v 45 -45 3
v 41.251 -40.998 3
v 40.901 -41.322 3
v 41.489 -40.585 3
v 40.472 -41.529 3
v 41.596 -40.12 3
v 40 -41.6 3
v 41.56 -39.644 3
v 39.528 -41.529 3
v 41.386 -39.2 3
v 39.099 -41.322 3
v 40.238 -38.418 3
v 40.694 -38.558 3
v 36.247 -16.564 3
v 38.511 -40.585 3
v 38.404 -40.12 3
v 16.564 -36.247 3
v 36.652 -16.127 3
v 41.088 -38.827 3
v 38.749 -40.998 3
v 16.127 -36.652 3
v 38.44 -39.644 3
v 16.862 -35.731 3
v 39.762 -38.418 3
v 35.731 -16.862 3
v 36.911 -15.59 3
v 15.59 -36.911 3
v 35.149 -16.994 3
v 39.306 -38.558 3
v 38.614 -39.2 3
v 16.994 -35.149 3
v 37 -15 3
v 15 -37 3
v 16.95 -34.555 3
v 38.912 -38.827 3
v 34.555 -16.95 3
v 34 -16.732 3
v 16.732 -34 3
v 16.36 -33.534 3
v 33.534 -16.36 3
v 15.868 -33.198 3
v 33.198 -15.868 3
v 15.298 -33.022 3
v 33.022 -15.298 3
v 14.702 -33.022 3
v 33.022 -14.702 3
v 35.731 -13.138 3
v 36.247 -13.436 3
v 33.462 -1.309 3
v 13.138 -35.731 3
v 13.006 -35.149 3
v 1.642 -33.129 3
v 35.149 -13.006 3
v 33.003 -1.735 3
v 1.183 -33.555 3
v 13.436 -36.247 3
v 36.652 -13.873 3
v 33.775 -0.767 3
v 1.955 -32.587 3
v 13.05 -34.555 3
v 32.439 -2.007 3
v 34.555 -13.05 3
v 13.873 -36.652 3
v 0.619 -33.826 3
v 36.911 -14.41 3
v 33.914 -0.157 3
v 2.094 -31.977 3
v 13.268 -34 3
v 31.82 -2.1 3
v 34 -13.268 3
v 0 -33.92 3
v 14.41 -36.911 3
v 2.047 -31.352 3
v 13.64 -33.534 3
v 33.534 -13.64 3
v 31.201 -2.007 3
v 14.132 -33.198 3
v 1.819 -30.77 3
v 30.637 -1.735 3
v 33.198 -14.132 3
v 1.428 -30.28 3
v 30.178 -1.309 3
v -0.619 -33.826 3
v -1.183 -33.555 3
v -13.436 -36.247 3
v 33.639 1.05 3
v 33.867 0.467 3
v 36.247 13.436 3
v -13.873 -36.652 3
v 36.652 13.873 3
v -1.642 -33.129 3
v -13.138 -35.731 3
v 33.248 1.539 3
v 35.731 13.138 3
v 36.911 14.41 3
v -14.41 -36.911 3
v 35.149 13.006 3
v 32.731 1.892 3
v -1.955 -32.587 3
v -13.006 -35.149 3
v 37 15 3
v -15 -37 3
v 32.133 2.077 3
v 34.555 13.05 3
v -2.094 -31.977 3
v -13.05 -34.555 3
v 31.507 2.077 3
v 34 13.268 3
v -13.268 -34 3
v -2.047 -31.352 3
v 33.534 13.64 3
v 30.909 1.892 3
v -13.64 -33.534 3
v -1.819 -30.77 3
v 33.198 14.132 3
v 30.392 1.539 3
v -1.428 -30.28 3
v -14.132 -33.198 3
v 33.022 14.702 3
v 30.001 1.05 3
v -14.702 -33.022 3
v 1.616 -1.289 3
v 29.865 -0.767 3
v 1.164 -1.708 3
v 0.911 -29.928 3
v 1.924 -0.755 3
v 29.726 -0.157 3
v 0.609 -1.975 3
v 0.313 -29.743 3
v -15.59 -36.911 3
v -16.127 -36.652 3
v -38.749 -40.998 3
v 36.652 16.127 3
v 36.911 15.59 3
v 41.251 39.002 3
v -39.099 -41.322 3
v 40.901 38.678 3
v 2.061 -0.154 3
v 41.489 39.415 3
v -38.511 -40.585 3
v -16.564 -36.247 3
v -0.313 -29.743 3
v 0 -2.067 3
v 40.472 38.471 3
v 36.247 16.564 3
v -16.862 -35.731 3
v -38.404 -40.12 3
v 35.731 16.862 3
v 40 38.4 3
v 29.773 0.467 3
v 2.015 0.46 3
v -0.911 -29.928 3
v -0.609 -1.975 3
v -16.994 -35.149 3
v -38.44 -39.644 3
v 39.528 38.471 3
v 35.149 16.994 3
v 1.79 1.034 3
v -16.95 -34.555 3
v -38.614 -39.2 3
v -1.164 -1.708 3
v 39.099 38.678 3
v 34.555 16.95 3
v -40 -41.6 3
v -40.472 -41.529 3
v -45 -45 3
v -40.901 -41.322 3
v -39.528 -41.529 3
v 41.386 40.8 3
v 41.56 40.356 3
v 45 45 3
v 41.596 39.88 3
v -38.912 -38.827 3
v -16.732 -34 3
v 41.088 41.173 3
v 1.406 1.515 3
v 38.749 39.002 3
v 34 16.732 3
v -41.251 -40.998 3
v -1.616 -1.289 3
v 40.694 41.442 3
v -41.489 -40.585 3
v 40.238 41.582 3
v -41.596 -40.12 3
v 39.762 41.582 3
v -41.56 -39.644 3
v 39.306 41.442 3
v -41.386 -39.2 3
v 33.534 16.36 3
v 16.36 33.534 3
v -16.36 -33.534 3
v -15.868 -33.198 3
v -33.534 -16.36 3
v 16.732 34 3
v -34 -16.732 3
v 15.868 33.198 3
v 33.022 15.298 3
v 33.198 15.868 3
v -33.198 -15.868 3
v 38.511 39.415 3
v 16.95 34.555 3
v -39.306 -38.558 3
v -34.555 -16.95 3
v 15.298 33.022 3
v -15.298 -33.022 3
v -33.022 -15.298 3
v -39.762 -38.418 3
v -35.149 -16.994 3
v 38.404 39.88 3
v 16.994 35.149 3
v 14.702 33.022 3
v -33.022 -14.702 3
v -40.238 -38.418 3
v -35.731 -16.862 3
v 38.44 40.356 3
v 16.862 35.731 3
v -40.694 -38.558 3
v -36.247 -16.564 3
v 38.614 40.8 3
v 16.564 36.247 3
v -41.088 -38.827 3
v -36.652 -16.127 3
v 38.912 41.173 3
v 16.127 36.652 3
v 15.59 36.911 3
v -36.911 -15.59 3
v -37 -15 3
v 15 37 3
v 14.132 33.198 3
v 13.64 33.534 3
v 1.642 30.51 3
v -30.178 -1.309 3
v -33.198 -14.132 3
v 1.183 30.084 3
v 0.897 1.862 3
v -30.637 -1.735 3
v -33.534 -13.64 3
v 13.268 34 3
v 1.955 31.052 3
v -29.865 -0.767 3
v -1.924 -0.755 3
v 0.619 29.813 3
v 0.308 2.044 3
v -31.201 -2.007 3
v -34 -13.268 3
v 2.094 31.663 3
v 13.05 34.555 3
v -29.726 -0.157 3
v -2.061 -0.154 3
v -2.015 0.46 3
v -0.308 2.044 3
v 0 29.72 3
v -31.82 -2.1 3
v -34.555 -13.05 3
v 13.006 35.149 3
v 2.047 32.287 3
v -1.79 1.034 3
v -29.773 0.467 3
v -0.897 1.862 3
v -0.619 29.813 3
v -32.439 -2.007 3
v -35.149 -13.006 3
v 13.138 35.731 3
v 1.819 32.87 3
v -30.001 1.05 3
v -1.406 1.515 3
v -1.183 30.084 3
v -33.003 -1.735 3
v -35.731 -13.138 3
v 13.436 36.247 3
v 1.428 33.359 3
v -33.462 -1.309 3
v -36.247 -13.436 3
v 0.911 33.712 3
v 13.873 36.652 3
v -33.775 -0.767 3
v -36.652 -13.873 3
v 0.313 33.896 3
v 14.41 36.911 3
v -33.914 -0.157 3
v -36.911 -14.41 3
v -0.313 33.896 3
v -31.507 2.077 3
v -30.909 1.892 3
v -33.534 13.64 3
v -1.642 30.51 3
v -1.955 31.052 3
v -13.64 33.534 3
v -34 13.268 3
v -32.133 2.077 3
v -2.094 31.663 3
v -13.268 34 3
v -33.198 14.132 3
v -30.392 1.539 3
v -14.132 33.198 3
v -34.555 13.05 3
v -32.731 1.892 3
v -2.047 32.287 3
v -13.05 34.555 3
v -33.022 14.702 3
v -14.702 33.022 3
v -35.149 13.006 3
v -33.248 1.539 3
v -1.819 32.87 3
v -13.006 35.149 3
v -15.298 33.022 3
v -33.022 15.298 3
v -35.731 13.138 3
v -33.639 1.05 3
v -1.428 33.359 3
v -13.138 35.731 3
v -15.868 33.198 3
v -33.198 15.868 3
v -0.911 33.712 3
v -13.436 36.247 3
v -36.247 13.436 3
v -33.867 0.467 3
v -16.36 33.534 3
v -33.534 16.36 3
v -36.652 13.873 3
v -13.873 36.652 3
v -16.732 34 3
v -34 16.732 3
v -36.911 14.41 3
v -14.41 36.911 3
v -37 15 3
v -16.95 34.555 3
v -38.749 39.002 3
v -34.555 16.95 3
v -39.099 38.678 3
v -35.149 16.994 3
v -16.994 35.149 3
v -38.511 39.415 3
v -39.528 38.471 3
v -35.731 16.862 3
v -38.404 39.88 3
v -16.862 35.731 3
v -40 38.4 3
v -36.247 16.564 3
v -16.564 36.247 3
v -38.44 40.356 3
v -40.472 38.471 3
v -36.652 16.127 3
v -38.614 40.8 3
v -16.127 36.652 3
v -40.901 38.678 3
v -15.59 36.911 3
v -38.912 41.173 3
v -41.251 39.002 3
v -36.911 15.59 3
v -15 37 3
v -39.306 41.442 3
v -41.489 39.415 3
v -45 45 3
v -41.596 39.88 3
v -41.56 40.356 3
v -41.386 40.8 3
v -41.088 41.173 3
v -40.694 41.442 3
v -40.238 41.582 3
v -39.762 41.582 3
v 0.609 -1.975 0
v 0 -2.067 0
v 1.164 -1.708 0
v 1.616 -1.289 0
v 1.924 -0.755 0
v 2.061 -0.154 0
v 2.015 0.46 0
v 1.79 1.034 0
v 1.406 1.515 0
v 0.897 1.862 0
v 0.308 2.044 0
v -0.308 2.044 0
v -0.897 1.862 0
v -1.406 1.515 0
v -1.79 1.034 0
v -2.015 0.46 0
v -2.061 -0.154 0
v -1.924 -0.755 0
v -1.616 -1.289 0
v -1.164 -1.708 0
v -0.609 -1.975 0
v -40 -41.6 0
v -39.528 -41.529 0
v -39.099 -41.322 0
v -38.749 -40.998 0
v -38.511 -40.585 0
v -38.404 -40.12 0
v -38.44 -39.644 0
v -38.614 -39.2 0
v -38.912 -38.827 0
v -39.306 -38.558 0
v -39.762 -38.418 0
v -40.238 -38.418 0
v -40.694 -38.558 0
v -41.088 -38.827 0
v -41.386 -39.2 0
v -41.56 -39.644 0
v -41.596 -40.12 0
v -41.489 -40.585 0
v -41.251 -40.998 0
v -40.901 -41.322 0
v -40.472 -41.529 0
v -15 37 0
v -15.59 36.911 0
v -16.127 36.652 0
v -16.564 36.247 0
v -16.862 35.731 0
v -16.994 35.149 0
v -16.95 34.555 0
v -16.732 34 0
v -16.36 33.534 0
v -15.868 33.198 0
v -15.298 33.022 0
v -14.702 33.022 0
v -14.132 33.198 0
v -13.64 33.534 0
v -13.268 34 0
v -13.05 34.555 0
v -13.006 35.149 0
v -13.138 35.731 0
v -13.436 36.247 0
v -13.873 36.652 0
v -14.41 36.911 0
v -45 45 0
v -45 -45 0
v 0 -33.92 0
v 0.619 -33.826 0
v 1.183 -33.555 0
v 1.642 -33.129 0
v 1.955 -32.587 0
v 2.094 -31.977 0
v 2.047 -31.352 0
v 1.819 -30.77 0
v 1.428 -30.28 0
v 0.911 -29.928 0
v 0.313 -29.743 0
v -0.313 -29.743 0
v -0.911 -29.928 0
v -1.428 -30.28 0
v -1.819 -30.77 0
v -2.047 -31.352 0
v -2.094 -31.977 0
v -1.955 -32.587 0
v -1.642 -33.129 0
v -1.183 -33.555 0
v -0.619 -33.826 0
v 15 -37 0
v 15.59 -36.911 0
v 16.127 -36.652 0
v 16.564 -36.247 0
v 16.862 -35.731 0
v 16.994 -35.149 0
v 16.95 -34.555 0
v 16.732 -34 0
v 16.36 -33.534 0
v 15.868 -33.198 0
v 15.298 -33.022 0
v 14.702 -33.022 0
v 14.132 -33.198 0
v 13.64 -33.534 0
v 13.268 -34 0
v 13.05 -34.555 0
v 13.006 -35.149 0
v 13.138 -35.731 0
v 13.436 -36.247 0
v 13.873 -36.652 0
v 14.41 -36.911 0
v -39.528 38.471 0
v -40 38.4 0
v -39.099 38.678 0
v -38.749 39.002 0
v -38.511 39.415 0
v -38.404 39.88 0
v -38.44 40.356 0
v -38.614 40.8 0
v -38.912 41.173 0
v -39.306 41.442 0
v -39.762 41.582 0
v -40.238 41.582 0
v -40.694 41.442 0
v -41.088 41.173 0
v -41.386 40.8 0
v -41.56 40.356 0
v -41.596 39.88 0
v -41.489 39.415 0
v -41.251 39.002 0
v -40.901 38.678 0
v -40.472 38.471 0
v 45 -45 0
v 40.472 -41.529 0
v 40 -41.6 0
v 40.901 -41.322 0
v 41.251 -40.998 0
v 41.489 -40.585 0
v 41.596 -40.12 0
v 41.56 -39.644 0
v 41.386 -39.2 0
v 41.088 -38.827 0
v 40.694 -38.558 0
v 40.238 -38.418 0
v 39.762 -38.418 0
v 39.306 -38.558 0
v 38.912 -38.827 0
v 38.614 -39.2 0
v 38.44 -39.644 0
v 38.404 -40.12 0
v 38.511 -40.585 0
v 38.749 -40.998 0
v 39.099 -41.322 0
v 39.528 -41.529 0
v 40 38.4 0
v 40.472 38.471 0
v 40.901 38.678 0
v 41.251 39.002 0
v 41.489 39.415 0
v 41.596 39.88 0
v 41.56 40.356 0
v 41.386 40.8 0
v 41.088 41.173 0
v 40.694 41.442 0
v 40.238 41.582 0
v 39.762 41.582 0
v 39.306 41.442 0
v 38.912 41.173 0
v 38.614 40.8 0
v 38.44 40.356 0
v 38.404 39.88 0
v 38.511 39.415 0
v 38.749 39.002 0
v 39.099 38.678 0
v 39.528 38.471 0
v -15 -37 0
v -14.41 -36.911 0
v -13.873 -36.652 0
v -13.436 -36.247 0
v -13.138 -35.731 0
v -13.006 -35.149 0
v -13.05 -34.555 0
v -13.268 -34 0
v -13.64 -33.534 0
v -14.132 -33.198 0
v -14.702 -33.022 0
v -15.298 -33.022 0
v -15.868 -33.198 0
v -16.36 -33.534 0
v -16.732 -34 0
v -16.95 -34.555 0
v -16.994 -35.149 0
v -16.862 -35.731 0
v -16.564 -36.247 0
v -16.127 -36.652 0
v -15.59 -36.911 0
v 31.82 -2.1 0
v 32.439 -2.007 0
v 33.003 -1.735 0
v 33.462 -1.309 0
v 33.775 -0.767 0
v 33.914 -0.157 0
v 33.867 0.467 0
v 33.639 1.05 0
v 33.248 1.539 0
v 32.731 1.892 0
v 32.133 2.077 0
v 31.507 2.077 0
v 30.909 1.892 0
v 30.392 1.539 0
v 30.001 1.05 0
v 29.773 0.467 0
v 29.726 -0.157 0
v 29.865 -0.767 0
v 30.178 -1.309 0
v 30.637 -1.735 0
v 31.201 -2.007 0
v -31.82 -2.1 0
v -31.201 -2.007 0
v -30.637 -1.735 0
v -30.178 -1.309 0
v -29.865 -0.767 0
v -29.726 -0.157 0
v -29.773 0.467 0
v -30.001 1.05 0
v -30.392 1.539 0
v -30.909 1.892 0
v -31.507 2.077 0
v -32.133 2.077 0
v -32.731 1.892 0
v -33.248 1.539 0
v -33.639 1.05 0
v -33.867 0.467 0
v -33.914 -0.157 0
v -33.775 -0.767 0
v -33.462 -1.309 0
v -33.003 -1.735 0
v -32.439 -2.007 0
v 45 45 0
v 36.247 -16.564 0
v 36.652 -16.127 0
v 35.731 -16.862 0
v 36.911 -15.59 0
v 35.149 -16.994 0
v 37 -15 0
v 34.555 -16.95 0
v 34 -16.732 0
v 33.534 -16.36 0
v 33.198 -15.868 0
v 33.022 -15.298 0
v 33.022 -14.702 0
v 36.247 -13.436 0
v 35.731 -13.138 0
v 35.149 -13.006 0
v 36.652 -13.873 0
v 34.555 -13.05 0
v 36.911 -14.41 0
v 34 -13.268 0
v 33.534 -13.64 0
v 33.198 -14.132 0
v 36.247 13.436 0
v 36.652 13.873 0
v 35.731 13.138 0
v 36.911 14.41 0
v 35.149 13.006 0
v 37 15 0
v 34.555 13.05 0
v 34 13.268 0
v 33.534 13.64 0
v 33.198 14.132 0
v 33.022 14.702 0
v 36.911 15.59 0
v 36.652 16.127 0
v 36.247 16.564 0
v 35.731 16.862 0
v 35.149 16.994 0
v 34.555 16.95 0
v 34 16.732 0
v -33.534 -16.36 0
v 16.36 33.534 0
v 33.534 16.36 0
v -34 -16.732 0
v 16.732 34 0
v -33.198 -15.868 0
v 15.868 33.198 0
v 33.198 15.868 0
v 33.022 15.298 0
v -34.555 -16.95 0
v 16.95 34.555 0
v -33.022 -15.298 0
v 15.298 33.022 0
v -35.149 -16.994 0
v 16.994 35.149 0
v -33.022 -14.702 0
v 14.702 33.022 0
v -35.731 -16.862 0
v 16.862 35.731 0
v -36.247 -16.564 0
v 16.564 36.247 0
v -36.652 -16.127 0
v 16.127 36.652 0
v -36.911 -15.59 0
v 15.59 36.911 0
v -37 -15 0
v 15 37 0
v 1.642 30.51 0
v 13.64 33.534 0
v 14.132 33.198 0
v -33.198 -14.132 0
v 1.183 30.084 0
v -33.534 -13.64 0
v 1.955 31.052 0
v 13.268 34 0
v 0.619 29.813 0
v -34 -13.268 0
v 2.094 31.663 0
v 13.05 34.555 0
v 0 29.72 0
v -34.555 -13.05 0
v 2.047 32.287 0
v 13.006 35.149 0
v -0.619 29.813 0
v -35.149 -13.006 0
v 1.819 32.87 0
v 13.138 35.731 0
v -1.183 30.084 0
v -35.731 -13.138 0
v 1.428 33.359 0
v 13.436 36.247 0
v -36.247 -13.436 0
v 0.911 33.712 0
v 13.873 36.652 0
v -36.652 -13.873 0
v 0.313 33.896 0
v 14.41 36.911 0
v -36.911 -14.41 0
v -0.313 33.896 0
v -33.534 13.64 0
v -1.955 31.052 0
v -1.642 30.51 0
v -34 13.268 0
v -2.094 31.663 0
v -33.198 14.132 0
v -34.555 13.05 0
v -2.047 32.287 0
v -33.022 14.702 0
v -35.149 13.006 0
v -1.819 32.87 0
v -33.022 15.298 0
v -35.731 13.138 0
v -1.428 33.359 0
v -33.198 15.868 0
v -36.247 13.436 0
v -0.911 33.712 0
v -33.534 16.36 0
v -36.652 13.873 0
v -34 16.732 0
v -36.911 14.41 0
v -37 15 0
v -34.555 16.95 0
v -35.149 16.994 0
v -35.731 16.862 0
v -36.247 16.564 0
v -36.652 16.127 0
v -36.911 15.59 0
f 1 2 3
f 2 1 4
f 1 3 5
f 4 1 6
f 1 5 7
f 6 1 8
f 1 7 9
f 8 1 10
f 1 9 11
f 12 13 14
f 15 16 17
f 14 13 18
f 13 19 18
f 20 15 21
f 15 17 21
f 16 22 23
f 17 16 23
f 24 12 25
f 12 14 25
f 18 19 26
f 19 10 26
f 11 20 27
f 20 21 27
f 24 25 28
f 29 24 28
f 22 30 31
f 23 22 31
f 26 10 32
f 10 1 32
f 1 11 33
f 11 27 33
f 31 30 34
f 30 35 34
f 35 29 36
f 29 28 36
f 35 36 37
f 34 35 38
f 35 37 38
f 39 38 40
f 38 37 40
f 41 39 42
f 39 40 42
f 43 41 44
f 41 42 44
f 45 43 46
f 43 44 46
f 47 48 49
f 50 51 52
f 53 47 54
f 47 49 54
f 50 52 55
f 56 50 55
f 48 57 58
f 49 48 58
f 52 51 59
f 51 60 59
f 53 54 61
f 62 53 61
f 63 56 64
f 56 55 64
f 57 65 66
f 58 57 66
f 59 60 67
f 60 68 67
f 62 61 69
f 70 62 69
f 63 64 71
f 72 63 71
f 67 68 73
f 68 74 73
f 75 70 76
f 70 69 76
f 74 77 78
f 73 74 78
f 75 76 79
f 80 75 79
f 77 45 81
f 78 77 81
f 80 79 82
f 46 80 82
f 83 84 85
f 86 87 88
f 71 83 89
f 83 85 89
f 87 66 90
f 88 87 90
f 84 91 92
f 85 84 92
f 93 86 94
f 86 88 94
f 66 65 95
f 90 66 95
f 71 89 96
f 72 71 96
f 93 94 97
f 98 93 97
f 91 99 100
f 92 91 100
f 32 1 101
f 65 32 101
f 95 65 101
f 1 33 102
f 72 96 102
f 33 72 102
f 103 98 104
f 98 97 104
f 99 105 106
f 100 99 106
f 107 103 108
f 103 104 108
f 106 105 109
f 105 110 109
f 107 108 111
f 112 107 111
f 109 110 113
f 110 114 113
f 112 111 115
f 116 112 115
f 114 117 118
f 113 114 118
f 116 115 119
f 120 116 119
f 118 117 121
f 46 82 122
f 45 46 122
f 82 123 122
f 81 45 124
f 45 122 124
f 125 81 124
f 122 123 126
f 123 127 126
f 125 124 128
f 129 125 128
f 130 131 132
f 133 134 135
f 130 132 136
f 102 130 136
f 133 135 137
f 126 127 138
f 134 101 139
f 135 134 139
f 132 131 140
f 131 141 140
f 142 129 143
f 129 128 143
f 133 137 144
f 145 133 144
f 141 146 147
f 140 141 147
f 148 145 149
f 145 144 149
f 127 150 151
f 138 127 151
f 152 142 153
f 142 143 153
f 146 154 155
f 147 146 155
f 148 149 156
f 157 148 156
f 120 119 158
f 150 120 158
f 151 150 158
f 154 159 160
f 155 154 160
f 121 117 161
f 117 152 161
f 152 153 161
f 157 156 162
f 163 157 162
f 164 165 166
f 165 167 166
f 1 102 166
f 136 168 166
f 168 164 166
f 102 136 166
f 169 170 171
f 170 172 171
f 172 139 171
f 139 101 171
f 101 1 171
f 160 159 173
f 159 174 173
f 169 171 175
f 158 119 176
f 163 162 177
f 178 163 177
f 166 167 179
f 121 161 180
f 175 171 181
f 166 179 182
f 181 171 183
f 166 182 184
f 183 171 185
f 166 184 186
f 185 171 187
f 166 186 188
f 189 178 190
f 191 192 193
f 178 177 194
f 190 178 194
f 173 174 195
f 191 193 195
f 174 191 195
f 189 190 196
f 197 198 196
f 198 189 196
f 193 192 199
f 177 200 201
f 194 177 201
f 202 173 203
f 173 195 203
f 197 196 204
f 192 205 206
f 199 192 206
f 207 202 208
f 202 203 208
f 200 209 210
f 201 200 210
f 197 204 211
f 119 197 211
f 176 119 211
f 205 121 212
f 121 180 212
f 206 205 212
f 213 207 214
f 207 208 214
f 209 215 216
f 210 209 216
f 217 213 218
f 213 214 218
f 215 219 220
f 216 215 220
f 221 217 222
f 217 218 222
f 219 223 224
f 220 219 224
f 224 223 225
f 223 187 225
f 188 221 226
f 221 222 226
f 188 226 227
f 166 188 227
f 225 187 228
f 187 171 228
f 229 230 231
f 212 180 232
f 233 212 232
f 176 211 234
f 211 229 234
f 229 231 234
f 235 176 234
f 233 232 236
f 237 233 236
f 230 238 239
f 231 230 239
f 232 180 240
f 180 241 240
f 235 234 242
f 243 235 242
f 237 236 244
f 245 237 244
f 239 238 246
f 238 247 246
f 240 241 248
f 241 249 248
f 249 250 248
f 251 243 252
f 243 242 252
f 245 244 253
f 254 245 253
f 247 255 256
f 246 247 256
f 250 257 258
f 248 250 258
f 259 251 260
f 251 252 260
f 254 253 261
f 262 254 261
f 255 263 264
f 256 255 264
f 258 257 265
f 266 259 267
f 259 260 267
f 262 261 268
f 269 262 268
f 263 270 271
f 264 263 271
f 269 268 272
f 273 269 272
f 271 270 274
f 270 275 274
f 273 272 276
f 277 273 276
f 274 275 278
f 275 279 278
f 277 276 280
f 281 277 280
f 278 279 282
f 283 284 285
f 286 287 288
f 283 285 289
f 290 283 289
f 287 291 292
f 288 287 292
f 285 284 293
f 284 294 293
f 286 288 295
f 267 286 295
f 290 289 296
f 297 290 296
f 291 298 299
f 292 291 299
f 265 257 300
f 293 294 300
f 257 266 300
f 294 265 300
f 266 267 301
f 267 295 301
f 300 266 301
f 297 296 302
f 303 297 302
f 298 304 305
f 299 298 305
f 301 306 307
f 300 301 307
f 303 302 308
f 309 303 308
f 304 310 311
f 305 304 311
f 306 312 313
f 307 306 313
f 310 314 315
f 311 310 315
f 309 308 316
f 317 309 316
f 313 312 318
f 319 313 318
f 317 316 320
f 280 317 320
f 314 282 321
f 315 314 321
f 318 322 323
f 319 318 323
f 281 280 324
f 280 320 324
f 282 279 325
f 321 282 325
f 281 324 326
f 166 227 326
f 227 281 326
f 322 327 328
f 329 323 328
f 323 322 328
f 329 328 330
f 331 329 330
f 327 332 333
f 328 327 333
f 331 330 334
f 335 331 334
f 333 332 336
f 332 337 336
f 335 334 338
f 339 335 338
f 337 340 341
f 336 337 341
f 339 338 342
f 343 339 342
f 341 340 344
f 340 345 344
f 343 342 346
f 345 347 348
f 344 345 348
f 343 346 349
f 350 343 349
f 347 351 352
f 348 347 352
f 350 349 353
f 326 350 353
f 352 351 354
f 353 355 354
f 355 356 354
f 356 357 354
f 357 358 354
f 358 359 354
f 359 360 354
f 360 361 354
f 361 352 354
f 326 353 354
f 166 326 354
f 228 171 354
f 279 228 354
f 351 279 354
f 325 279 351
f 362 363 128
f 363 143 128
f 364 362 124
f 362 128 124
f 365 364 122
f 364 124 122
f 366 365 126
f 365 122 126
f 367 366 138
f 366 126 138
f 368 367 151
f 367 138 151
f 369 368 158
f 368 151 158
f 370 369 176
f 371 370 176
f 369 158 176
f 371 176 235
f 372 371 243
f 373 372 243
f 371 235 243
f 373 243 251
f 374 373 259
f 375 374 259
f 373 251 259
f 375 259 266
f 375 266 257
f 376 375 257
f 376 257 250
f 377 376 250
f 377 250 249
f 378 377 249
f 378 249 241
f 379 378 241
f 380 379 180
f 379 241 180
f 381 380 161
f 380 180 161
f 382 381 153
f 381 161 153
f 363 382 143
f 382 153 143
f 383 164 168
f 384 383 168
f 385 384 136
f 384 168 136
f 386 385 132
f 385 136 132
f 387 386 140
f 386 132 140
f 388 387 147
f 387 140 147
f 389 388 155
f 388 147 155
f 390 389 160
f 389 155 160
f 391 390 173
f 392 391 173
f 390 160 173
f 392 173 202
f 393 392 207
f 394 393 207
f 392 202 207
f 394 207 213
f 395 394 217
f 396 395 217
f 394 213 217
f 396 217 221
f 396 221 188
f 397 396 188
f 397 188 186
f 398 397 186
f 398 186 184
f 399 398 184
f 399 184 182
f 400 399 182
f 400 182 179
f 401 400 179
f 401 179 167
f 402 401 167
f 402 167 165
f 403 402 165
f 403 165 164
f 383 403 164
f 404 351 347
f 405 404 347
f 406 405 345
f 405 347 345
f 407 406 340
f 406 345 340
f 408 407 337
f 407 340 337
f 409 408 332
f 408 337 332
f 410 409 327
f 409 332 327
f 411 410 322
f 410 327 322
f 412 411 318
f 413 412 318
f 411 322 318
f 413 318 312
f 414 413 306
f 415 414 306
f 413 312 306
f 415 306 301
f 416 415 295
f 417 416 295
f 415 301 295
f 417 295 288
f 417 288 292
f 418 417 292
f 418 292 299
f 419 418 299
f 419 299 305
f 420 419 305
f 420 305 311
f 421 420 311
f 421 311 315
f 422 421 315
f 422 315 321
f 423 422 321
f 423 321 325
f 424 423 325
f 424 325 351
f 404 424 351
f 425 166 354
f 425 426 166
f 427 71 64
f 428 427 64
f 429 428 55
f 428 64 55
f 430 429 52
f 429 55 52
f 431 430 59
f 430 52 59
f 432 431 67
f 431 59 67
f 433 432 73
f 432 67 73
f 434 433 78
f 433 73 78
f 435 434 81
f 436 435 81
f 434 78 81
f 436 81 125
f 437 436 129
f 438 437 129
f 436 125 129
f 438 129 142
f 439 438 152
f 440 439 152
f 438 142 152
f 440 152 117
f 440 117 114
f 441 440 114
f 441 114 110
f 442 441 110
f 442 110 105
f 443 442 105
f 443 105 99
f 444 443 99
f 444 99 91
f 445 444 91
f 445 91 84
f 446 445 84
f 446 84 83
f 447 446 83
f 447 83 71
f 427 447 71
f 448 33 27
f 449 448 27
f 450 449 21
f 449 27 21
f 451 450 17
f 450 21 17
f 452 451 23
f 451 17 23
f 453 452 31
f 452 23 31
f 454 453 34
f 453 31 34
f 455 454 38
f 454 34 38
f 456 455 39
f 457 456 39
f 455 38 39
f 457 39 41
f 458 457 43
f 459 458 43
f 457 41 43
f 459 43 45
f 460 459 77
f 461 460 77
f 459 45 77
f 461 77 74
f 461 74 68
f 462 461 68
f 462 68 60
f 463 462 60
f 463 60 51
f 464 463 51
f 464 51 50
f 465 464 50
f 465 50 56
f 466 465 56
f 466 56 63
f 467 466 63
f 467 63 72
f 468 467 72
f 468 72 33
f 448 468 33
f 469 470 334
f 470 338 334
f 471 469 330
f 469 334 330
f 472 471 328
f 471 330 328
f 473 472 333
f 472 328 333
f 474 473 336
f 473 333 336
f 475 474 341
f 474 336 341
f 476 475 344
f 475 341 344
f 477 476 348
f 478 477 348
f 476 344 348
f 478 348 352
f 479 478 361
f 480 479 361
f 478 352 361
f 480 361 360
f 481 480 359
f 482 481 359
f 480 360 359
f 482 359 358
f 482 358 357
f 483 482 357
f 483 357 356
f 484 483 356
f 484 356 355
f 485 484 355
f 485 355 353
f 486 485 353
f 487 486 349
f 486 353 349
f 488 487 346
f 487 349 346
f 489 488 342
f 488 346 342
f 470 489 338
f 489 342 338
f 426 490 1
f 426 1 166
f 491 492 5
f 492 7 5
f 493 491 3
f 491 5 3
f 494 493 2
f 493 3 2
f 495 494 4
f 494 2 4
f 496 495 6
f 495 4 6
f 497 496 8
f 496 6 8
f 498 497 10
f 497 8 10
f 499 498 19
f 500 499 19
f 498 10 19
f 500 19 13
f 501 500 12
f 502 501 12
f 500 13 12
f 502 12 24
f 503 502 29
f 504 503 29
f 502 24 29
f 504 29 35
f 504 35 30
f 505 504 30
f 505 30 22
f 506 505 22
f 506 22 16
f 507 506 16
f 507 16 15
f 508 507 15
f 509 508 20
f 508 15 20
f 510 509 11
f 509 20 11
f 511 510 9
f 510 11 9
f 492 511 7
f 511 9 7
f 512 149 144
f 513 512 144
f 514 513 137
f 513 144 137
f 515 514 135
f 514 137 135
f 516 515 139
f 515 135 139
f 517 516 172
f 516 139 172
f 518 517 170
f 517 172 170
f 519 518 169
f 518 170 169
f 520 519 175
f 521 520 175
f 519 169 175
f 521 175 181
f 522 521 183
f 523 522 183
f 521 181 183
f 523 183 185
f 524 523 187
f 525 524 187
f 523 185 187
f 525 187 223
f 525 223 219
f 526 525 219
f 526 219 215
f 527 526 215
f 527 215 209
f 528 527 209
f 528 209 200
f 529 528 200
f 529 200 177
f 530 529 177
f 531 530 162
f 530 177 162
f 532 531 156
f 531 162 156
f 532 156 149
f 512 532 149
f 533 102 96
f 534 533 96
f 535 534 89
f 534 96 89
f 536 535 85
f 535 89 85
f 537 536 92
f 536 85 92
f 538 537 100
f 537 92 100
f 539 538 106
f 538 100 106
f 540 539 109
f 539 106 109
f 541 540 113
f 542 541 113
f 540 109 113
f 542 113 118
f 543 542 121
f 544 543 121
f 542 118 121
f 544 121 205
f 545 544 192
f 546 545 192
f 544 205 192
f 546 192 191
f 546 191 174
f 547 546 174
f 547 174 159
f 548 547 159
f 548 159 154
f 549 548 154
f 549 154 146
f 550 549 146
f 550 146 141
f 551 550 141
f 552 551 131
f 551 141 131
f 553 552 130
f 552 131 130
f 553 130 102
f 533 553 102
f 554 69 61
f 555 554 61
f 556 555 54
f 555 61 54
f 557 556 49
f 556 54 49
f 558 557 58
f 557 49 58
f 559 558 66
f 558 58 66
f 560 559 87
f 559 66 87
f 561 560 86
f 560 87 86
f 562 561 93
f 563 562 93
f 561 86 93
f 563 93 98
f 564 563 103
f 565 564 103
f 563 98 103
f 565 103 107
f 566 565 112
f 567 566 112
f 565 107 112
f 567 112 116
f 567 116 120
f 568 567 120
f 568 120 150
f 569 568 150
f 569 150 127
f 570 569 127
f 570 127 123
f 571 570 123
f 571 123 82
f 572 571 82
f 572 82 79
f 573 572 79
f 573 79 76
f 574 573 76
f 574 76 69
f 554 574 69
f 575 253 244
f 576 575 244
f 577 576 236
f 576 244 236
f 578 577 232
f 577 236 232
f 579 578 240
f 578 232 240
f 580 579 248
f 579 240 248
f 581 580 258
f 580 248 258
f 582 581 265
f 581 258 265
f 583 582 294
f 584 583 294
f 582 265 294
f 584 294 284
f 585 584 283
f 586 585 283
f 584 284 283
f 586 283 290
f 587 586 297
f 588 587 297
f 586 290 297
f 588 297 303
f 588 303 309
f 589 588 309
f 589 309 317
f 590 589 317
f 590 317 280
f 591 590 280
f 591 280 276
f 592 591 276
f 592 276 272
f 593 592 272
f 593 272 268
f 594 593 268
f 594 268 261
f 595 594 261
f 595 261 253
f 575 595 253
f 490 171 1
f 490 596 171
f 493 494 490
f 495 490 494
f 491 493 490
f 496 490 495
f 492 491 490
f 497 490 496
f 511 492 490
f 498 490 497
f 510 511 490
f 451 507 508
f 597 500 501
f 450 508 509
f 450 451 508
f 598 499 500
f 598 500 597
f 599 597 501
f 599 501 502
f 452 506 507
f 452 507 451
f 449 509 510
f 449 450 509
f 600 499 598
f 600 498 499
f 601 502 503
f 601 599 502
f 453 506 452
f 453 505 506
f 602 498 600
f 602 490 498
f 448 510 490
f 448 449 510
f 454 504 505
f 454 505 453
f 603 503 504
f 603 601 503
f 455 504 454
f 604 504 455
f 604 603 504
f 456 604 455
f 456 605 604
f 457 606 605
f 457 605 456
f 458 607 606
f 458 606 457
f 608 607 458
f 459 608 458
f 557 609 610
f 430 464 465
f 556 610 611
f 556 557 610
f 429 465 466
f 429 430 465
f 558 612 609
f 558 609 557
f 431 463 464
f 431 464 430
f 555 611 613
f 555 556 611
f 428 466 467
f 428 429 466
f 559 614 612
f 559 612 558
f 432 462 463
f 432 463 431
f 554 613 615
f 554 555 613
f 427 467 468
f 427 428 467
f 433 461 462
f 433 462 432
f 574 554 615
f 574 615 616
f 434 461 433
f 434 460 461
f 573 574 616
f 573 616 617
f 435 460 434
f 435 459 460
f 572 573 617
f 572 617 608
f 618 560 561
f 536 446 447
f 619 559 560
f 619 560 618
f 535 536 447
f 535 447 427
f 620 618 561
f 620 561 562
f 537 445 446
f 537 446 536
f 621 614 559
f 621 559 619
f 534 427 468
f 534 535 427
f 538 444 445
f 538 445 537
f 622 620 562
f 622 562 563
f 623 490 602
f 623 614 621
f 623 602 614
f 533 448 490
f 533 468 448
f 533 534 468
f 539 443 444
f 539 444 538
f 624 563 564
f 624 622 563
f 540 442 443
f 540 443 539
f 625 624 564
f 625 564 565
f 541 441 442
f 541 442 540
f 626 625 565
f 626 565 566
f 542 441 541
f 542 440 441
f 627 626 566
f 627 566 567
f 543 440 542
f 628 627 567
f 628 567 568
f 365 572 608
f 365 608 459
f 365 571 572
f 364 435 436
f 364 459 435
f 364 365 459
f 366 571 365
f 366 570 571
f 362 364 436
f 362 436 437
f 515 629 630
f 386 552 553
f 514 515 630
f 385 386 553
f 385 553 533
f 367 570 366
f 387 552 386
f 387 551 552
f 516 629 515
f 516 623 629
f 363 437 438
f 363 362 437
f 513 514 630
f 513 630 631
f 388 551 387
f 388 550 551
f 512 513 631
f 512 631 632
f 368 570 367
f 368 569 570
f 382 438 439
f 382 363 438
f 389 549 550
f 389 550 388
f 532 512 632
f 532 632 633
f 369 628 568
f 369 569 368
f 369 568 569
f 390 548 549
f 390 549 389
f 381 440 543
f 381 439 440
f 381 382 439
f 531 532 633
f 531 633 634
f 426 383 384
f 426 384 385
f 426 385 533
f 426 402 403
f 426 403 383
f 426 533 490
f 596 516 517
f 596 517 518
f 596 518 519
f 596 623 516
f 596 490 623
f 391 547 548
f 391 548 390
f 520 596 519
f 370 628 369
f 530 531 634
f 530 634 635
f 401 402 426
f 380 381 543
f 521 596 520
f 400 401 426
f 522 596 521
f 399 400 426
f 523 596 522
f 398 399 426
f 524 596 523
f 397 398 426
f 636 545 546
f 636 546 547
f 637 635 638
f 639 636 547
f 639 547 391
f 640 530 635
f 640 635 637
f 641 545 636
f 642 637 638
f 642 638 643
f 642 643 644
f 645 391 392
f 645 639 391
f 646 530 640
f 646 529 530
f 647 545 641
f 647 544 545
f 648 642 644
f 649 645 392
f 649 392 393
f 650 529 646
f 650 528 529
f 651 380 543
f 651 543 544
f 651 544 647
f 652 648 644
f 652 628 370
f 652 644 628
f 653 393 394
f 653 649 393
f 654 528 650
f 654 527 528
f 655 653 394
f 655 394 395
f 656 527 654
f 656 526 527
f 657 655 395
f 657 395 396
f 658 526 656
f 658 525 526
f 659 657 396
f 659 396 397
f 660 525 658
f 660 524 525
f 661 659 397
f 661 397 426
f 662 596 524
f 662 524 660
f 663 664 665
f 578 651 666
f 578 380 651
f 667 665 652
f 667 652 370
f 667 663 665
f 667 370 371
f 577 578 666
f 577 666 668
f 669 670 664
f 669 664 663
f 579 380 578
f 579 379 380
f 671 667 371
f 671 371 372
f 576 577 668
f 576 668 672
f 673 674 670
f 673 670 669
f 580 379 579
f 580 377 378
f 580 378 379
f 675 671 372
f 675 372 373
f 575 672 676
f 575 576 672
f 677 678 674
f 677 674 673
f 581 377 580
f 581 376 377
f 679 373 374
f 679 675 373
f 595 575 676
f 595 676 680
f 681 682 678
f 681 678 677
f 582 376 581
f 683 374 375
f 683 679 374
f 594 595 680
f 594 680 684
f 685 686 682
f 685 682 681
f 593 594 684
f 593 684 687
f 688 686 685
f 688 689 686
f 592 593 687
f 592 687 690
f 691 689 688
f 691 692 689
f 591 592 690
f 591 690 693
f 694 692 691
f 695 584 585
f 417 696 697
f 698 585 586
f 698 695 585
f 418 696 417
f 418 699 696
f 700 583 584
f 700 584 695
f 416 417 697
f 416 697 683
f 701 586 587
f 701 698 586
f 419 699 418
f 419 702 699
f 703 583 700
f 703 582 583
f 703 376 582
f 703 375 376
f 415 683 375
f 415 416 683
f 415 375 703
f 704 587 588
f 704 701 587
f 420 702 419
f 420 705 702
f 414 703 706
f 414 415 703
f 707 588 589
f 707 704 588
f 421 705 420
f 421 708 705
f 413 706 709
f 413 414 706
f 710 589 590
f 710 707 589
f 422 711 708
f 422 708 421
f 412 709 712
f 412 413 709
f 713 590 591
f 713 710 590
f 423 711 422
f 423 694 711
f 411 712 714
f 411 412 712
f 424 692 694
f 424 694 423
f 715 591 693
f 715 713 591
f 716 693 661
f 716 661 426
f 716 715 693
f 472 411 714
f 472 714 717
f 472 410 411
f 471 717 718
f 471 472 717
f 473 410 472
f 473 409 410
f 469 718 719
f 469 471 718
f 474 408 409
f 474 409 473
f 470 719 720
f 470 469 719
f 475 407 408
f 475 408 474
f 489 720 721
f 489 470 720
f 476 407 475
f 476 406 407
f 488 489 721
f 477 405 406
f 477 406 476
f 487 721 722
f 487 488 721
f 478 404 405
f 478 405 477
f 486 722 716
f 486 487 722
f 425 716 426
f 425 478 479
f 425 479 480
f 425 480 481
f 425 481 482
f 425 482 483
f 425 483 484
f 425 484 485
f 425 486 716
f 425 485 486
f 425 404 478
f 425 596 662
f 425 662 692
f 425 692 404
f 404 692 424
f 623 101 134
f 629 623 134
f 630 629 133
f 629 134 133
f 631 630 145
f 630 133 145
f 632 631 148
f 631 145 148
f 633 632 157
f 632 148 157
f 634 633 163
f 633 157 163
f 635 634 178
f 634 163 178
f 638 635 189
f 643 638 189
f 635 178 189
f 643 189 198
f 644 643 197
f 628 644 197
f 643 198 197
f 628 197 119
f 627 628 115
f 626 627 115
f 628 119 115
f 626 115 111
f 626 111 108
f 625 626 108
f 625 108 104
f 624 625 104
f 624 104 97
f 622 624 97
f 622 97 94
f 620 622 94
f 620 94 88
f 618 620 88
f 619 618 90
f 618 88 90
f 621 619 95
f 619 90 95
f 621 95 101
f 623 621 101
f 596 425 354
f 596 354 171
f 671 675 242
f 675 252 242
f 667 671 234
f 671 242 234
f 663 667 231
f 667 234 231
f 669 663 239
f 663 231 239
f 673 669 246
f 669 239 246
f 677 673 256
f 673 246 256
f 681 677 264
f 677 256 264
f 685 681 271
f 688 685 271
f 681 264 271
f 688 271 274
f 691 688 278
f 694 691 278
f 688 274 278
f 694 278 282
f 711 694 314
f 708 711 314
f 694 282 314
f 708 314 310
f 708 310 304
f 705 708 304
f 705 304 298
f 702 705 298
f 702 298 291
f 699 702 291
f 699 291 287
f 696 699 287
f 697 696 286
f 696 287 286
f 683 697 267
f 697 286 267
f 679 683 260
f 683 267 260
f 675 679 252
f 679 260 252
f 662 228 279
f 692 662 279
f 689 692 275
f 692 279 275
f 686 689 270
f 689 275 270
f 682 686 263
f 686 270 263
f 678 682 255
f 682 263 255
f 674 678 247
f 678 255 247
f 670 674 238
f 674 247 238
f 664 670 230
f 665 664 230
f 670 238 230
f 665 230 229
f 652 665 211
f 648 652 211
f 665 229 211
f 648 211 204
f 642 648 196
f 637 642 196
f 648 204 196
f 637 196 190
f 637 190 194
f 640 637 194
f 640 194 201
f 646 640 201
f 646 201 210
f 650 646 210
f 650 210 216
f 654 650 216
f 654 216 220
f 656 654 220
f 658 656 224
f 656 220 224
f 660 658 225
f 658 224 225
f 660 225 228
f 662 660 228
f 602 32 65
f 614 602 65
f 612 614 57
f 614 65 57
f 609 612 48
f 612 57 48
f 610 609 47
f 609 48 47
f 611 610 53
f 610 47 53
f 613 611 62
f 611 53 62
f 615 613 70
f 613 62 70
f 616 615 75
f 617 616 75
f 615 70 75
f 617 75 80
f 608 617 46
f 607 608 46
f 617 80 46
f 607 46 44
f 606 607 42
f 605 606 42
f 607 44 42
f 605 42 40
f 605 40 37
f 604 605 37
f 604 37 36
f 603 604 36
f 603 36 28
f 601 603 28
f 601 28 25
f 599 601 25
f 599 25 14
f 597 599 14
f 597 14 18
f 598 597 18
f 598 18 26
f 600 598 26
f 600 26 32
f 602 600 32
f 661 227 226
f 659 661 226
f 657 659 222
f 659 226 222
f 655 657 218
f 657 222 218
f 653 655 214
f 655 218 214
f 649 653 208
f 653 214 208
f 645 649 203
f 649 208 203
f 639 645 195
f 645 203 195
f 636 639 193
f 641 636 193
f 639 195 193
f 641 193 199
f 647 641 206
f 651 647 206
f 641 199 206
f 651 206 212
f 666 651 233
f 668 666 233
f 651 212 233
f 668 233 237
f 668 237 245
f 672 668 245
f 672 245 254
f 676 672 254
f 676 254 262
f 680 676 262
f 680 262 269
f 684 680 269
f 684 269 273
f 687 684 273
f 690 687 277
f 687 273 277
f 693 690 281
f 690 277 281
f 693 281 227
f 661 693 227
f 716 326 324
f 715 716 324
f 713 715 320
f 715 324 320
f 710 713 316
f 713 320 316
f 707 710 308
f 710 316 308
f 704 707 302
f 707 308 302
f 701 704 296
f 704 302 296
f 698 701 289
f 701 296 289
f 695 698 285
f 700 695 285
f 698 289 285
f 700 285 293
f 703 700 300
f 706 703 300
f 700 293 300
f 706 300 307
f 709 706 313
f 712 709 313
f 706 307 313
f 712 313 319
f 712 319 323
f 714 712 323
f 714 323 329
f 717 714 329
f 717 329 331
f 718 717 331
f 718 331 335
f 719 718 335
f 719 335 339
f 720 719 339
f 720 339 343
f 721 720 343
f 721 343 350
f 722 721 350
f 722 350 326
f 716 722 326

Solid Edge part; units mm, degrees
sketch "Sketch1" plane through (0, 0, 0) normal (0, 0, 1) x (1, 0, 0)
  line L0 (45, -45) -> (-45, -45)
  line L1 (-45, -45) -> (-45, 45)
  line L2 (-45, 45) -> (45, 45)
  line L3 (45, 45) -> (45, -45)
  dimension "D1" = 90
  dimension "D2" = 90
extrude "Protrusion1" add sketch "Sketch1" along normal blind 3
hole "Hole_3" at (-40, 40, 3) direction (0, 0, -1) diameter 3.2 end through all
hole "Hole1" at (-40, -40, 3) direction (0, 0, -1) diameter 3.2 end through all
hole "Hole2" at (40, -40, 3) direction (0, 0, -1) diameter 3.2 end through all
hole "Hole3" at (40, 40, 3) direction (0, 0, -1) diameter 3.2 end through all
hole "Hole4" at (-31.82, 0, 3) direction (0, 0, -1) diameter 4.2 end through all
hole "Hole5" at (0, 31.8196, 3) direction (0, 0, -1) diameter 4.2 end through all
hole "Hole6" at (31.82, 0, 3) direction (0, 0, -1) diameter 4.2 end through all
hole "Hole7" at (0, -31.8196, 3) direction (0, 0, -1) diameter 4.2 end through all
hole "Hole_11" at (0, 0, 3) direction (0, 0, -1) diameter 4.134 end up to next thread major 5 thread length 2
hole "Hole_16" at (-15, -35, 3) direction (0, 0, -1) diameter 4 end up to next
hole "Hole8" at (15, -35, 3) direction (0, 0, -1) diameter 4 end up to next
pattern_circular "Pattern2" count 4 over 360 about axis through (0, 0, 3) along (0, 0, -1) of "Hole_16", "Hole8"
properties material "アルミニウム, 5050"
